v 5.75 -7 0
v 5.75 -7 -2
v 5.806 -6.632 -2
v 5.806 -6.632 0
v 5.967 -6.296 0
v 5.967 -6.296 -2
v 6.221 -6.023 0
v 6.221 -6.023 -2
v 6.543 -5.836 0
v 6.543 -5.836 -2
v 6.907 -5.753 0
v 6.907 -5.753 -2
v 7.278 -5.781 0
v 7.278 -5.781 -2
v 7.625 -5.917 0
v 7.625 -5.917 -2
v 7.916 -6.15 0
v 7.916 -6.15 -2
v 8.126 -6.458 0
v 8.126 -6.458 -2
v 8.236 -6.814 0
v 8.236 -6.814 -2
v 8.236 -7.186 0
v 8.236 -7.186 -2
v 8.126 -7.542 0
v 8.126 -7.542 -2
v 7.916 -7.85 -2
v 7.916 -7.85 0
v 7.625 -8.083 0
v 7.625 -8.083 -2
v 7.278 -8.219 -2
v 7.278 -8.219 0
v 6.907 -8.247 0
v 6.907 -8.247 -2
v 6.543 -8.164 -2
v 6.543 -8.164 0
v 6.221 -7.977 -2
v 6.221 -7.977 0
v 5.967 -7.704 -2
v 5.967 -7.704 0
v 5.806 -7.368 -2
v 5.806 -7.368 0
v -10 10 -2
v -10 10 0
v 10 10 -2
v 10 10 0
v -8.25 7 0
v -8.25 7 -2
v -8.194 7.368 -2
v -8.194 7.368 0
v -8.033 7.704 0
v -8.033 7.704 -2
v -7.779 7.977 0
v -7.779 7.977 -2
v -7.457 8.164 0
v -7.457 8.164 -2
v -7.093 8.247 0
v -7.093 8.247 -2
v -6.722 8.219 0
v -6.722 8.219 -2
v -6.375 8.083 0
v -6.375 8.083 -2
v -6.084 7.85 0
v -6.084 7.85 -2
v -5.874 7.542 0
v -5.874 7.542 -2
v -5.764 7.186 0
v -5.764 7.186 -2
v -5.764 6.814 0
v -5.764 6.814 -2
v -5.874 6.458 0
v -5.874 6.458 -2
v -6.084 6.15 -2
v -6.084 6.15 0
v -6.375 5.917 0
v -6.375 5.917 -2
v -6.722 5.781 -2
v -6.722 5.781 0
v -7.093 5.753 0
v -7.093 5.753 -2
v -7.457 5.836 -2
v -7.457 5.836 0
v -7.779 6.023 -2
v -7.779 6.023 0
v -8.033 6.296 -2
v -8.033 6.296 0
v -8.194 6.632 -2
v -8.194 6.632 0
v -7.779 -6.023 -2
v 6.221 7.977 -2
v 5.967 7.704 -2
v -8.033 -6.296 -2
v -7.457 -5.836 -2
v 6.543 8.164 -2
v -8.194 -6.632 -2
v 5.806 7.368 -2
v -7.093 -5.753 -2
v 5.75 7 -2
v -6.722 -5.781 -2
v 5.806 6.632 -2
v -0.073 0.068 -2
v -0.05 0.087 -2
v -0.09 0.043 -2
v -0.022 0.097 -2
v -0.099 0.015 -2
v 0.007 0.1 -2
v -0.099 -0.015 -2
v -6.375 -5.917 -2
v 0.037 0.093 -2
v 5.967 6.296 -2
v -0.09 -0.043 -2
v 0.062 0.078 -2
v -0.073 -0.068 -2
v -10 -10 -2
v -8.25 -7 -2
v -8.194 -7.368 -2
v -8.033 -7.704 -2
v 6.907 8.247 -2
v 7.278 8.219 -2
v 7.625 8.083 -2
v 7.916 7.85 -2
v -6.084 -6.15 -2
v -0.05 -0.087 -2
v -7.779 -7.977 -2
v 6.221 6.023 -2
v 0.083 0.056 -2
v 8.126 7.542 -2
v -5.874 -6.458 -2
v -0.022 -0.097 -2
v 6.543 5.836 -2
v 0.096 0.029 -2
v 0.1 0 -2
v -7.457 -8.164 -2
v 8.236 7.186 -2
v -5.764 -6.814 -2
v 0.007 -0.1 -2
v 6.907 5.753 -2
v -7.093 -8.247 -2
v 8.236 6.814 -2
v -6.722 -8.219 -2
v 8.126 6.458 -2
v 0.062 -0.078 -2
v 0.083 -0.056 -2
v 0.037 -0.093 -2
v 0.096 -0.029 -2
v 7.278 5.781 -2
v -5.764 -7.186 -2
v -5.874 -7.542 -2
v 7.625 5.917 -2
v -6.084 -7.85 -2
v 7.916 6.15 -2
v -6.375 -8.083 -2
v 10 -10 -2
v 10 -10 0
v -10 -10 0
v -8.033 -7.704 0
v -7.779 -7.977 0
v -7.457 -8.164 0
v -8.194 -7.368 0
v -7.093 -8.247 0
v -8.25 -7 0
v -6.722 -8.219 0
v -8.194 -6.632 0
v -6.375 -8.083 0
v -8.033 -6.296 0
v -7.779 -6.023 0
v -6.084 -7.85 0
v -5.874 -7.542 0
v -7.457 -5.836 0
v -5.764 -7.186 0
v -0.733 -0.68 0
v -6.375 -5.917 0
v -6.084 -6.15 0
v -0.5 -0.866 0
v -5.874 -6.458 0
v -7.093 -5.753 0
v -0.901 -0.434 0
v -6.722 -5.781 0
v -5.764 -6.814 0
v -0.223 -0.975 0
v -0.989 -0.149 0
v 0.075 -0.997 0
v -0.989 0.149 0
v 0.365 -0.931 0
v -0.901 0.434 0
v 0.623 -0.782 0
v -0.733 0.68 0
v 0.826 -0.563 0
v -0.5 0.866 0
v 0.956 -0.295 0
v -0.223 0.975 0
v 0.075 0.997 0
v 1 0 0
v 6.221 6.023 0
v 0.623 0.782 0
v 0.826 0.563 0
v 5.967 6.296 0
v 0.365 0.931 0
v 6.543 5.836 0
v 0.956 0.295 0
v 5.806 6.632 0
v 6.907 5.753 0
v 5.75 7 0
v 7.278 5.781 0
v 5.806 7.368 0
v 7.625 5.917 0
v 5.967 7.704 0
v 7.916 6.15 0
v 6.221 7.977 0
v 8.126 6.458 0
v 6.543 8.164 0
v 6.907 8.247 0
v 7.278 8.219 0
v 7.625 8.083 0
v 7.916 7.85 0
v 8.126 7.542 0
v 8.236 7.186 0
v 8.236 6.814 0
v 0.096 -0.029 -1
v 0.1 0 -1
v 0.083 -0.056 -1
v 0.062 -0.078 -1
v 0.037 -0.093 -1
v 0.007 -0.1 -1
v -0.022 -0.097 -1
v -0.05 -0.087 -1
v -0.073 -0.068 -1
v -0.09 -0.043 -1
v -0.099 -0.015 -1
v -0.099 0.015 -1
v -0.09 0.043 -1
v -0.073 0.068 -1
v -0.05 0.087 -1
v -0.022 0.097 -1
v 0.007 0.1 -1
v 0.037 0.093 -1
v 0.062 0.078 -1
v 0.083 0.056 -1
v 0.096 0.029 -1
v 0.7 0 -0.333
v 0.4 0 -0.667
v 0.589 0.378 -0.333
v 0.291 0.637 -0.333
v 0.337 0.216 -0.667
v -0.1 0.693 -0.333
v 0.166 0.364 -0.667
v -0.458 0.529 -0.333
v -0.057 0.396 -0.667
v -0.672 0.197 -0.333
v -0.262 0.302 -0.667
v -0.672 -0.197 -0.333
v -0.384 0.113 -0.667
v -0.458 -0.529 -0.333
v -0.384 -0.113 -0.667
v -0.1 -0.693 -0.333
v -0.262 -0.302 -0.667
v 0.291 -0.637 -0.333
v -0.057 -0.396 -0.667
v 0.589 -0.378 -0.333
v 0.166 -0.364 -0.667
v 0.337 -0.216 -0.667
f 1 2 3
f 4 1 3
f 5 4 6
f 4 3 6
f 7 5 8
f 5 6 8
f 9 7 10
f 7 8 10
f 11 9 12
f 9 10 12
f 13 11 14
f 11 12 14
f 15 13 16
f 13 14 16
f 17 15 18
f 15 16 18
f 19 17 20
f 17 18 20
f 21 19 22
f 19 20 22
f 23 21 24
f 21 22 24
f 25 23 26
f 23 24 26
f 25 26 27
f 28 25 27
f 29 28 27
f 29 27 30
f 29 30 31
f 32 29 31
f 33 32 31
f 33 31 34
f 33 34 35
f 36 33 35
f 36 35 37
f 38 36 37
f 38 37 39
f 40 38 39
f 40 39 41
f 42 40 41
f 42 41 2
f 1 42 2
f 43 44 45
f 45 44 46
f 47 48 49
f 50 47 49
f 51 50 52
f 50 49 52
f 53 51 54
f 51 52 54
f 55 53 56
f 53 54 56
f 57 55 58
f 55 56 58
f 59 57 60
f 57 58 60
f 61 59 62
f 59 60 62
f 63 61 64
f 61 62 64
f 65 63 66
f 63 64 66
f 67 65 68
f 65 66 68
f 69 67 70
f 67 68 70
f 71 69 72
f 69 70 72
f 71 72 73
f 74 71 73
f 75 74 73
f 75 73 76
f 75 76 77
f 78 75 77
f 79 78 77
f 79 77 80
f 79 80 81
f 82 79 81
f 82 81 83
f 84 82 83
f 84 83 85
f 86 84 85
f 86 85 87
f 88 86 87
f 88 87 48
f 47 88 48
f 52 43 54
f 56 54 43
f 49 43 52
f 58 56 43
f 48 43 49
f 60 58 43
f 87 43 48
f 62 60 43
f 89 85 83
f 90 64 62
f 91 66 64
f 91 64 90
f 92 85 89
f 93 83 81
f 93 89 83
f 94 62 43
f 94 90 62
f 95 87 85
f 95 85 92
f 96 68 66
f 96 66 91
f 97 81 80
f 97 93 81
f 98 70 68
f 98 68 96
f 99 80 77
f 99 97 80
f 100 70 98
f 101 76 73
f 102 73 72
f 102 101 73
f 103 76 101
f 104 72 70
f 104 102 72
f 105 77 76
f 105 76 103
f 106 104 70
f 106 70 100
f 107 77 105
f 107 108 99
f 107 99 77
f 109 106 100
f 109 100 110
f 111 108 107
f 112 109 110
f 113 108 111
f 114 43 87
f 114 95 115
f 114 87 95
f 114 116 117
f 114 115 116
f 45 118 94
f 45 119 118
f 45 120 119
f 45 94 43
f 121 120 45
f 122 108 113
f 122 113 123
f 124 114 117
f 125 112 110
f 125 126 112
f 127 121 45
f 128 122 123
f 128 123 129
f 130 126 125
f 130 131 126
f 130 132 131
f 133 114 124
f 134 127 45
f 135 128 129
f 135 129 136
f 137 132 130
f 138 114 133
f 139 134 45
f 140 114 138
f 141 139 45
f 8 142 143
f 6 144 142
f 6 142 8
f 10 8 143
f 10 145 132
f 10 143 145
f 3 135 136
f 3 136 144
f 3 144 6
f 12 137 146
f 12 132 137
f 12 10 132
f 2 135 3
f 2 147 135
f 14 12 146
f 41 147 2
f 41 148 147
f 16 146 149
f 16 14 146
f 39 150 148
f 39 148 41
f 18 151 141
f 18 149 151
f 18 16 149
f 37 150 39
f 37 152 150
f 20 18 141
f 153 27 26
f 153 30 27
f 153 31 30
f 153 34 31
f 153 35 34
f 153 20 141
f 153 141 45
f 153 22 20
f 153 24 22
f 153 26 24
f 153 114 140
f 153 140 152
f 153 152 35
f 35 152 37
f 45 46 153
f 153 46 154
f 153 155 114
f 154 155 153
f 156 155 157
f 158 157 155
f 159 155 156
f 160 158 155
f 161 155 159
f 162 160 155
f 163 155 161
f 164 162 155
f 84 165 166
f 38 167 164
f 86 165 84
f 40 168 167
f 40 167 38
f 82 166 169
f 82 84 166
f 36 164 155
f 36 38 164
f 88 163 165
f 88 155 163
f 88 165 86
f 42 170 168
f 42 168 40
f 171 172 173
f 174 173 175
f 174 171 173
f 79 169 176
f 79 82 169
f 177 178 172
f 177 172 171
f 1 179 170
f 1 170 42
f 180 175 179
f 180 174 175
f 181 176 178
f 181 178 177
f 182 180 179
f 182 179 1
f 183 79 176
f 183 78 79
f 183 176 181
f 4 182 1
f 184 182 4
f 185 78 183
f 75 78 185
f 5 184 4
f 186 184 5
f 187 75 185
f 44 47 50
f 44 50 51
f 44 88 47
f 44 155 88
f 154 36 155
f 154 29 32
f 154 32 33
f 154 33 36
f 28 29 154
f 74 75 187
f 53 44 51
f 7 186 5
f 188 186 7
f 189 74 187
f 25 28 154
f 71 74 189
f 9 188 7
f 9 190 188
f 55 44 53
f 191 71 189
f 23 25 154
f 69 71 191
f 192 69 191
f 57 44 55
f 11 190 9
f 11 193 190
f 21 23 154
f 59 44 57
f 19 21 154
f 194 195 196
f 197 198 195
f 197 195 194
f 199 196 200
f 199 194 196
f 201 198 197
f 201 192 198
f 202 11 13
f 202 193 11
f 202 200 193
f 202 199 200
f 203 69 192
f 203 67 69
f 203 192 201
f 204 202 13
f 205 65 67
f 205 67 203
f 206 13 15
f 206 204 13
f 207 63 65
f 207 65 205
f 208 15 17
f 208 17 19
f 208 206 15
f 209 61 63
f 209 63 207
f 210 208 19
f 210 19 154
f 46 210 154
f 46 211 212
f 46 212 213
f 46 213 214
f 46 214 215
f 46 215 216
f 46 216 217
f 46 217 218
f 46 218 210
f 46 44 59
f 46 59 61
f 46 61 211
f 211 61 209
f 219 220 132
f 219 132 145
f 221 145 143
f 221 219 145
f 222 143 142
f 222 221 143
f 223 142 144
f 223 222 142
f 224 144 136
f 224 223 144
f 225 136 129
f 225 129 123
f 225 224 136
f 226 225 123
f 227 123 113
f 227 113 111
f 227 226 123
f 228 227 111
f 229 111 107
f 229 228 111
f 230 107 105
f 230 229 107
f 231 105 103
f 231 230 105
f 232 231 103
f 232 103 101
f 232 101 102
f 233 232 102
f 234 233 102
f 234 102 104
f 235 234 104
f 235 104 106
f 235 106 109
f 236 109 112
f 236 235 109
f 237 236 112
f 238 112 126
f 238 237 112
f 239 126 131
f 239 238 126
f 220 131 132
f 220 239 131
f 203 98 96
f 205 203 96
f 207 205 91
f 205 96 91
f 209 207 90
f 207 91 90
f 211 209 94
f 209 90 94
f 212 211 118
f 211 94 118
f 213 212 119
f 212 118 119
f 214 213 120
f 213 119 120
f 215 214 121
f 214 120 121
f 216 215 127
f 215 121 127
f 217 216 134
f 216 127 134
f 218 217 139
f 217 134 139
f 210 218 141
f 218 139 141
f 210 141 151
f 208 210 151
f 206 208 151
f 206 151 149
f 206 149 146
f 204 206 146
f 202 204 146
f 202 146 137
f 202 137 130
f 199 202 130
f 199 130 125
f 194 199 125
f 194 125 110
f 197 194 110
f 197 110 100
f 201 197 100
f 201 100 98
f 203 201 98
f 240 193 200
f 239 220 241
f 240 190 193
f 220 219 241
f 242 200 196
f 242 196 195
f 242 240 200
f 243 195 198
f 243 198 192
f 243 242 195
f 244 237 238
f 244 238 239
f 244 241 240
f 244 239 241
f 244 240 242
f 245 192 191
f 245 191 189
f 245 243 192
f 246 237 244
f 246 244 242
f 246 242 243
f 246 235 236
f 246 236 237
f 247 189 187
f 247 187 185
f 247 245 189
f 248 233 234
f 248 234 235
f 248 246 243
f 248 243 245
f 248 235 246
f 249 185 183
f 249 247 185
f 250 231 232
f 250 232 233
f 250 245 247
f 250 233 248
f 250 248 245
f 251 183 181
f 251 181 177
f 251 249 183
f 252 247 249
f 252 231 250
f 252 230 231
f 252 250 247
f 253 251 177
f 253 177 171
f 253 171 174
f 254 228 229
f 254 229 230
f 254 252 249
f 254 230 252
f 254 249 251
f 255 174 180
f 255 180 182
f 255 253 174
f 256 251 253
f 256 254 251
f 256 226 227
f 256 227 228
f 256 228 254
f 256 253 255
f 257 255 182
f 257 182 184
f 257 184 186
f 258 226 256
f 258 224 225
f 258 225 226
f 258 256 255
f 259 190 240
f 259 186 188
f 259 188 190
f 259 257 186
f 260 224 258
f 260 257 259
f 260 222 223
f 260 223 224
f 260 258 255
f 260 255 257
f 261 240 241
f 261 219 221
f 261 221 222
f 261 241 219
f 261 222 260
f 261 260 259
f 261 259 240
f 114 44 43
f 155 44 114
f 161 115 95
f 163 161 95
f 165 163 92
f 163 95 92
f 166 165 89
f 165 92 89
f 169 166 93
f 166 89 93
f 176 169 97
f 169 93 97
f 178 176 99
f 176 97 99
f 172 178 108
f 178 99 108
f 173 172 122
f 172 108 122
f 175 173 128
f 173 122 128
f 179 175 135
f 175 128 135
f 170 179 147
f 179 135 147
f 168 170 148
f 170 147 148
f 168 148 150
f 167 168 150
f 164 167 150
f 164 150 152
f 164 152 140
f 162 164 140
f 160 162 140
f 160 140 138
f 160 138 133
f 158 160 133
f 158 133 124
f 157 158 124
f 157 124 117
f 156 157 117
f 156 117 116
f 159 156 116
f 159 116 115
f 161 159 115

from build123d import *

# Parameters (mm, degrees)
F0_W     = 20
F0_H     = 20
F1_DEPTH = 1
F2_R     = 1
F3_R     = 0.1
F6_W     = 20
F6_H     = 20
F6_R     = 0.1
F7_DEPTH = 1
F8_D     = 2.5


with BuildPart() as f1:
    # F0 (on Top) → F1 (new body)
    with BuildSketch(Plane.XY):
        Rectangle(F0_W, F0_H)
    extrude(amount=-F1_DEPTH)

    # F2 (on face) → F4 section 0
    with BuildSketch(Plane.XY):
        Circle(F2_R)
    # F3 (on face) → F4 section 1
    with BuildSketch(Plane(origin=(0, 0, -1), x_dir=(1, 0, 0), z_dir=(0, 0, -1))):
        Circle(F3_R)
    loft(mode=Mode.SUBTRACT)

    # F6 (on face) → F7 (join)
    with BuildSketch(Plane(origin=(0, 0, -1), x_dir=(1, 0, 0), z_dir=(0, 0, -1))):
        Rectangle(F6_W, F6_H)
        Circle(F6_R, mode=Mode.SUBTRACT)
    extrude(amount=F7_DEPTH)

    # F8 (through all)
    with Locations(Plane.XY):
        with Locations((-7, -7), (7, -7), (7, 7), (-7, 7)):
            Hole(F8_D / 2)


solid = f1.part
